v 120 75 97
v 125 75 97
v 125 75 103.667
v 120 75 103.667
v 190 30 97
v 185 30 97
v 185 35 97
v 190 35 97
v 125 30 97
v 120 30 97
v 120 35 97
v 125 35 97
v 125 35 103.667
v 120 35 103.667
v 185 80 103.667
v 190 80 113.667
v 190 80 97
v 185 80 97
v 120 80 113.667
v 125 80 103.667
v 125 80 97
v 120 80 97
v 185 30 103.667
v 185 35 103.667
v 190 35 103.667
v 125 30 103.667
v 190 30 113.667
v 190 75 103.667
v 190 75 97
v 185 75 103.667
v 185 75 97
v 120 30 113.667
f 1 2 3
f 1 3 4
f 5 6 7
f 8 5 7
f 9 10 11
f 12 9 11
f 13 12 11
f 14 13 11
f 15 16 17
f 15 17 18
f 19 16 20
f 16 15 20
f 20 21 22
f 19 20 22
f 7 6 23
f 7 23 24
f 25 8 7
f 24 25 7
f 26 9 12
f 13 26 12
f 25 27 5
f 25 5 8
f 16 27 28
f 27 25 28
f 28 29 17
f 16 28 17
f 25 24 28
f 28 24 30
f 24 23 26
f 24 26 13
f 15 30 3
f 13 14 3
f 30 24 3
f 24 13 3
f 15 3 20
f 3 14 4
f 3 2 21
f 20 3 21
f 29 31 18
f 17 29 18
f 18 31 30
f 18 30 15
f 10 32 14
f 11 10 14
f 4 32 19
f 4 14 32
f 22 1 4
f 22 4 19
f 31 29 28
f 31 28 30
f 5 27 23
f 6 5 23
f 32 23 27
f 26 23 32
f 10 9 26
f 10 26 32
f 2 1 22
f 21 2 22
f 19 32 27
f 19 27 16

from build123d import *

# Parameters (mm, degrees)
BOX012_W                  = 5
BOX012_H                  = 5
BOX012_DEPTH              = 6.66667
ARRAY_X_COUNT             = 2
ARRAY_X_PITCH             = 45
ARRAY_Y_COUNT             = 2
ARRAY_Y_PITCH             = 65
BOX011_W                  = 50
BOX011_H                  = 70
BOX011_DEPTH              = 10
FUSION003_PLACEMENT_ANGLE = 90


with BuildPart() as patas_de_la_cama:
    # Box012 → Box012 (new body)
    with BuildSketch(Plane(origin=(30, 20, 0), x_dir=(1, 0, 0), z_dir=(0, 0, 1))):
        with Locations((2.5, 2.5)):
            Rectangle(BOX012_W, BOX012_H)
    extrude(amount=BOX012_DEPTH)

    # Array X: Patas de la cama ×2


with BuildPart() as patas_de_la_cama_1:
    add(patas_de_la_cama.part)
    with Locations(*[(i * ARRAY_X_PITCH, 0, 0) for i in range(1, ARRAY_X_COUNT)]):
        add(patas_de_la_cama.part)

    # Array Y: Patas de la cama ×2


with BuildPart() as patas_de_la_cama_2:
    add(patas_de_la_cama_1.part)
    with Locations(*[(0, i * ARRAY_Y_PITCH, 0) for i in range(1, ARRAY_Y_COUNT)]):
        add(patas_de_la_cama_1.part)


with BuildPart() as fusion003:
    # Box011 → Box011 (new body)
    with BuildSketch(Plane(origin=(30, 20, 6.66667), x_dir=(1, 0, 0), z_dir=(0, 0, 1))):
        with Locations((25, 35)):
            Rectangle(BOX011_W, BOX011_H)
    extrude(amount=BOX011_DEPTH)

    # Fusion003: union Patas de la cama
    add(patas_de_la_cama_2.part)


with BuildPart() as fusion003_1:
    # Fusion003 placement: moved
    add(fusion003.part.moved(Location((210, 0, 97))).rotate(Axis((210, 0, 97), (0, 0, 1)), FUSION003_PLACEMENT_ANGLE))


solid = fusion003_1.part
